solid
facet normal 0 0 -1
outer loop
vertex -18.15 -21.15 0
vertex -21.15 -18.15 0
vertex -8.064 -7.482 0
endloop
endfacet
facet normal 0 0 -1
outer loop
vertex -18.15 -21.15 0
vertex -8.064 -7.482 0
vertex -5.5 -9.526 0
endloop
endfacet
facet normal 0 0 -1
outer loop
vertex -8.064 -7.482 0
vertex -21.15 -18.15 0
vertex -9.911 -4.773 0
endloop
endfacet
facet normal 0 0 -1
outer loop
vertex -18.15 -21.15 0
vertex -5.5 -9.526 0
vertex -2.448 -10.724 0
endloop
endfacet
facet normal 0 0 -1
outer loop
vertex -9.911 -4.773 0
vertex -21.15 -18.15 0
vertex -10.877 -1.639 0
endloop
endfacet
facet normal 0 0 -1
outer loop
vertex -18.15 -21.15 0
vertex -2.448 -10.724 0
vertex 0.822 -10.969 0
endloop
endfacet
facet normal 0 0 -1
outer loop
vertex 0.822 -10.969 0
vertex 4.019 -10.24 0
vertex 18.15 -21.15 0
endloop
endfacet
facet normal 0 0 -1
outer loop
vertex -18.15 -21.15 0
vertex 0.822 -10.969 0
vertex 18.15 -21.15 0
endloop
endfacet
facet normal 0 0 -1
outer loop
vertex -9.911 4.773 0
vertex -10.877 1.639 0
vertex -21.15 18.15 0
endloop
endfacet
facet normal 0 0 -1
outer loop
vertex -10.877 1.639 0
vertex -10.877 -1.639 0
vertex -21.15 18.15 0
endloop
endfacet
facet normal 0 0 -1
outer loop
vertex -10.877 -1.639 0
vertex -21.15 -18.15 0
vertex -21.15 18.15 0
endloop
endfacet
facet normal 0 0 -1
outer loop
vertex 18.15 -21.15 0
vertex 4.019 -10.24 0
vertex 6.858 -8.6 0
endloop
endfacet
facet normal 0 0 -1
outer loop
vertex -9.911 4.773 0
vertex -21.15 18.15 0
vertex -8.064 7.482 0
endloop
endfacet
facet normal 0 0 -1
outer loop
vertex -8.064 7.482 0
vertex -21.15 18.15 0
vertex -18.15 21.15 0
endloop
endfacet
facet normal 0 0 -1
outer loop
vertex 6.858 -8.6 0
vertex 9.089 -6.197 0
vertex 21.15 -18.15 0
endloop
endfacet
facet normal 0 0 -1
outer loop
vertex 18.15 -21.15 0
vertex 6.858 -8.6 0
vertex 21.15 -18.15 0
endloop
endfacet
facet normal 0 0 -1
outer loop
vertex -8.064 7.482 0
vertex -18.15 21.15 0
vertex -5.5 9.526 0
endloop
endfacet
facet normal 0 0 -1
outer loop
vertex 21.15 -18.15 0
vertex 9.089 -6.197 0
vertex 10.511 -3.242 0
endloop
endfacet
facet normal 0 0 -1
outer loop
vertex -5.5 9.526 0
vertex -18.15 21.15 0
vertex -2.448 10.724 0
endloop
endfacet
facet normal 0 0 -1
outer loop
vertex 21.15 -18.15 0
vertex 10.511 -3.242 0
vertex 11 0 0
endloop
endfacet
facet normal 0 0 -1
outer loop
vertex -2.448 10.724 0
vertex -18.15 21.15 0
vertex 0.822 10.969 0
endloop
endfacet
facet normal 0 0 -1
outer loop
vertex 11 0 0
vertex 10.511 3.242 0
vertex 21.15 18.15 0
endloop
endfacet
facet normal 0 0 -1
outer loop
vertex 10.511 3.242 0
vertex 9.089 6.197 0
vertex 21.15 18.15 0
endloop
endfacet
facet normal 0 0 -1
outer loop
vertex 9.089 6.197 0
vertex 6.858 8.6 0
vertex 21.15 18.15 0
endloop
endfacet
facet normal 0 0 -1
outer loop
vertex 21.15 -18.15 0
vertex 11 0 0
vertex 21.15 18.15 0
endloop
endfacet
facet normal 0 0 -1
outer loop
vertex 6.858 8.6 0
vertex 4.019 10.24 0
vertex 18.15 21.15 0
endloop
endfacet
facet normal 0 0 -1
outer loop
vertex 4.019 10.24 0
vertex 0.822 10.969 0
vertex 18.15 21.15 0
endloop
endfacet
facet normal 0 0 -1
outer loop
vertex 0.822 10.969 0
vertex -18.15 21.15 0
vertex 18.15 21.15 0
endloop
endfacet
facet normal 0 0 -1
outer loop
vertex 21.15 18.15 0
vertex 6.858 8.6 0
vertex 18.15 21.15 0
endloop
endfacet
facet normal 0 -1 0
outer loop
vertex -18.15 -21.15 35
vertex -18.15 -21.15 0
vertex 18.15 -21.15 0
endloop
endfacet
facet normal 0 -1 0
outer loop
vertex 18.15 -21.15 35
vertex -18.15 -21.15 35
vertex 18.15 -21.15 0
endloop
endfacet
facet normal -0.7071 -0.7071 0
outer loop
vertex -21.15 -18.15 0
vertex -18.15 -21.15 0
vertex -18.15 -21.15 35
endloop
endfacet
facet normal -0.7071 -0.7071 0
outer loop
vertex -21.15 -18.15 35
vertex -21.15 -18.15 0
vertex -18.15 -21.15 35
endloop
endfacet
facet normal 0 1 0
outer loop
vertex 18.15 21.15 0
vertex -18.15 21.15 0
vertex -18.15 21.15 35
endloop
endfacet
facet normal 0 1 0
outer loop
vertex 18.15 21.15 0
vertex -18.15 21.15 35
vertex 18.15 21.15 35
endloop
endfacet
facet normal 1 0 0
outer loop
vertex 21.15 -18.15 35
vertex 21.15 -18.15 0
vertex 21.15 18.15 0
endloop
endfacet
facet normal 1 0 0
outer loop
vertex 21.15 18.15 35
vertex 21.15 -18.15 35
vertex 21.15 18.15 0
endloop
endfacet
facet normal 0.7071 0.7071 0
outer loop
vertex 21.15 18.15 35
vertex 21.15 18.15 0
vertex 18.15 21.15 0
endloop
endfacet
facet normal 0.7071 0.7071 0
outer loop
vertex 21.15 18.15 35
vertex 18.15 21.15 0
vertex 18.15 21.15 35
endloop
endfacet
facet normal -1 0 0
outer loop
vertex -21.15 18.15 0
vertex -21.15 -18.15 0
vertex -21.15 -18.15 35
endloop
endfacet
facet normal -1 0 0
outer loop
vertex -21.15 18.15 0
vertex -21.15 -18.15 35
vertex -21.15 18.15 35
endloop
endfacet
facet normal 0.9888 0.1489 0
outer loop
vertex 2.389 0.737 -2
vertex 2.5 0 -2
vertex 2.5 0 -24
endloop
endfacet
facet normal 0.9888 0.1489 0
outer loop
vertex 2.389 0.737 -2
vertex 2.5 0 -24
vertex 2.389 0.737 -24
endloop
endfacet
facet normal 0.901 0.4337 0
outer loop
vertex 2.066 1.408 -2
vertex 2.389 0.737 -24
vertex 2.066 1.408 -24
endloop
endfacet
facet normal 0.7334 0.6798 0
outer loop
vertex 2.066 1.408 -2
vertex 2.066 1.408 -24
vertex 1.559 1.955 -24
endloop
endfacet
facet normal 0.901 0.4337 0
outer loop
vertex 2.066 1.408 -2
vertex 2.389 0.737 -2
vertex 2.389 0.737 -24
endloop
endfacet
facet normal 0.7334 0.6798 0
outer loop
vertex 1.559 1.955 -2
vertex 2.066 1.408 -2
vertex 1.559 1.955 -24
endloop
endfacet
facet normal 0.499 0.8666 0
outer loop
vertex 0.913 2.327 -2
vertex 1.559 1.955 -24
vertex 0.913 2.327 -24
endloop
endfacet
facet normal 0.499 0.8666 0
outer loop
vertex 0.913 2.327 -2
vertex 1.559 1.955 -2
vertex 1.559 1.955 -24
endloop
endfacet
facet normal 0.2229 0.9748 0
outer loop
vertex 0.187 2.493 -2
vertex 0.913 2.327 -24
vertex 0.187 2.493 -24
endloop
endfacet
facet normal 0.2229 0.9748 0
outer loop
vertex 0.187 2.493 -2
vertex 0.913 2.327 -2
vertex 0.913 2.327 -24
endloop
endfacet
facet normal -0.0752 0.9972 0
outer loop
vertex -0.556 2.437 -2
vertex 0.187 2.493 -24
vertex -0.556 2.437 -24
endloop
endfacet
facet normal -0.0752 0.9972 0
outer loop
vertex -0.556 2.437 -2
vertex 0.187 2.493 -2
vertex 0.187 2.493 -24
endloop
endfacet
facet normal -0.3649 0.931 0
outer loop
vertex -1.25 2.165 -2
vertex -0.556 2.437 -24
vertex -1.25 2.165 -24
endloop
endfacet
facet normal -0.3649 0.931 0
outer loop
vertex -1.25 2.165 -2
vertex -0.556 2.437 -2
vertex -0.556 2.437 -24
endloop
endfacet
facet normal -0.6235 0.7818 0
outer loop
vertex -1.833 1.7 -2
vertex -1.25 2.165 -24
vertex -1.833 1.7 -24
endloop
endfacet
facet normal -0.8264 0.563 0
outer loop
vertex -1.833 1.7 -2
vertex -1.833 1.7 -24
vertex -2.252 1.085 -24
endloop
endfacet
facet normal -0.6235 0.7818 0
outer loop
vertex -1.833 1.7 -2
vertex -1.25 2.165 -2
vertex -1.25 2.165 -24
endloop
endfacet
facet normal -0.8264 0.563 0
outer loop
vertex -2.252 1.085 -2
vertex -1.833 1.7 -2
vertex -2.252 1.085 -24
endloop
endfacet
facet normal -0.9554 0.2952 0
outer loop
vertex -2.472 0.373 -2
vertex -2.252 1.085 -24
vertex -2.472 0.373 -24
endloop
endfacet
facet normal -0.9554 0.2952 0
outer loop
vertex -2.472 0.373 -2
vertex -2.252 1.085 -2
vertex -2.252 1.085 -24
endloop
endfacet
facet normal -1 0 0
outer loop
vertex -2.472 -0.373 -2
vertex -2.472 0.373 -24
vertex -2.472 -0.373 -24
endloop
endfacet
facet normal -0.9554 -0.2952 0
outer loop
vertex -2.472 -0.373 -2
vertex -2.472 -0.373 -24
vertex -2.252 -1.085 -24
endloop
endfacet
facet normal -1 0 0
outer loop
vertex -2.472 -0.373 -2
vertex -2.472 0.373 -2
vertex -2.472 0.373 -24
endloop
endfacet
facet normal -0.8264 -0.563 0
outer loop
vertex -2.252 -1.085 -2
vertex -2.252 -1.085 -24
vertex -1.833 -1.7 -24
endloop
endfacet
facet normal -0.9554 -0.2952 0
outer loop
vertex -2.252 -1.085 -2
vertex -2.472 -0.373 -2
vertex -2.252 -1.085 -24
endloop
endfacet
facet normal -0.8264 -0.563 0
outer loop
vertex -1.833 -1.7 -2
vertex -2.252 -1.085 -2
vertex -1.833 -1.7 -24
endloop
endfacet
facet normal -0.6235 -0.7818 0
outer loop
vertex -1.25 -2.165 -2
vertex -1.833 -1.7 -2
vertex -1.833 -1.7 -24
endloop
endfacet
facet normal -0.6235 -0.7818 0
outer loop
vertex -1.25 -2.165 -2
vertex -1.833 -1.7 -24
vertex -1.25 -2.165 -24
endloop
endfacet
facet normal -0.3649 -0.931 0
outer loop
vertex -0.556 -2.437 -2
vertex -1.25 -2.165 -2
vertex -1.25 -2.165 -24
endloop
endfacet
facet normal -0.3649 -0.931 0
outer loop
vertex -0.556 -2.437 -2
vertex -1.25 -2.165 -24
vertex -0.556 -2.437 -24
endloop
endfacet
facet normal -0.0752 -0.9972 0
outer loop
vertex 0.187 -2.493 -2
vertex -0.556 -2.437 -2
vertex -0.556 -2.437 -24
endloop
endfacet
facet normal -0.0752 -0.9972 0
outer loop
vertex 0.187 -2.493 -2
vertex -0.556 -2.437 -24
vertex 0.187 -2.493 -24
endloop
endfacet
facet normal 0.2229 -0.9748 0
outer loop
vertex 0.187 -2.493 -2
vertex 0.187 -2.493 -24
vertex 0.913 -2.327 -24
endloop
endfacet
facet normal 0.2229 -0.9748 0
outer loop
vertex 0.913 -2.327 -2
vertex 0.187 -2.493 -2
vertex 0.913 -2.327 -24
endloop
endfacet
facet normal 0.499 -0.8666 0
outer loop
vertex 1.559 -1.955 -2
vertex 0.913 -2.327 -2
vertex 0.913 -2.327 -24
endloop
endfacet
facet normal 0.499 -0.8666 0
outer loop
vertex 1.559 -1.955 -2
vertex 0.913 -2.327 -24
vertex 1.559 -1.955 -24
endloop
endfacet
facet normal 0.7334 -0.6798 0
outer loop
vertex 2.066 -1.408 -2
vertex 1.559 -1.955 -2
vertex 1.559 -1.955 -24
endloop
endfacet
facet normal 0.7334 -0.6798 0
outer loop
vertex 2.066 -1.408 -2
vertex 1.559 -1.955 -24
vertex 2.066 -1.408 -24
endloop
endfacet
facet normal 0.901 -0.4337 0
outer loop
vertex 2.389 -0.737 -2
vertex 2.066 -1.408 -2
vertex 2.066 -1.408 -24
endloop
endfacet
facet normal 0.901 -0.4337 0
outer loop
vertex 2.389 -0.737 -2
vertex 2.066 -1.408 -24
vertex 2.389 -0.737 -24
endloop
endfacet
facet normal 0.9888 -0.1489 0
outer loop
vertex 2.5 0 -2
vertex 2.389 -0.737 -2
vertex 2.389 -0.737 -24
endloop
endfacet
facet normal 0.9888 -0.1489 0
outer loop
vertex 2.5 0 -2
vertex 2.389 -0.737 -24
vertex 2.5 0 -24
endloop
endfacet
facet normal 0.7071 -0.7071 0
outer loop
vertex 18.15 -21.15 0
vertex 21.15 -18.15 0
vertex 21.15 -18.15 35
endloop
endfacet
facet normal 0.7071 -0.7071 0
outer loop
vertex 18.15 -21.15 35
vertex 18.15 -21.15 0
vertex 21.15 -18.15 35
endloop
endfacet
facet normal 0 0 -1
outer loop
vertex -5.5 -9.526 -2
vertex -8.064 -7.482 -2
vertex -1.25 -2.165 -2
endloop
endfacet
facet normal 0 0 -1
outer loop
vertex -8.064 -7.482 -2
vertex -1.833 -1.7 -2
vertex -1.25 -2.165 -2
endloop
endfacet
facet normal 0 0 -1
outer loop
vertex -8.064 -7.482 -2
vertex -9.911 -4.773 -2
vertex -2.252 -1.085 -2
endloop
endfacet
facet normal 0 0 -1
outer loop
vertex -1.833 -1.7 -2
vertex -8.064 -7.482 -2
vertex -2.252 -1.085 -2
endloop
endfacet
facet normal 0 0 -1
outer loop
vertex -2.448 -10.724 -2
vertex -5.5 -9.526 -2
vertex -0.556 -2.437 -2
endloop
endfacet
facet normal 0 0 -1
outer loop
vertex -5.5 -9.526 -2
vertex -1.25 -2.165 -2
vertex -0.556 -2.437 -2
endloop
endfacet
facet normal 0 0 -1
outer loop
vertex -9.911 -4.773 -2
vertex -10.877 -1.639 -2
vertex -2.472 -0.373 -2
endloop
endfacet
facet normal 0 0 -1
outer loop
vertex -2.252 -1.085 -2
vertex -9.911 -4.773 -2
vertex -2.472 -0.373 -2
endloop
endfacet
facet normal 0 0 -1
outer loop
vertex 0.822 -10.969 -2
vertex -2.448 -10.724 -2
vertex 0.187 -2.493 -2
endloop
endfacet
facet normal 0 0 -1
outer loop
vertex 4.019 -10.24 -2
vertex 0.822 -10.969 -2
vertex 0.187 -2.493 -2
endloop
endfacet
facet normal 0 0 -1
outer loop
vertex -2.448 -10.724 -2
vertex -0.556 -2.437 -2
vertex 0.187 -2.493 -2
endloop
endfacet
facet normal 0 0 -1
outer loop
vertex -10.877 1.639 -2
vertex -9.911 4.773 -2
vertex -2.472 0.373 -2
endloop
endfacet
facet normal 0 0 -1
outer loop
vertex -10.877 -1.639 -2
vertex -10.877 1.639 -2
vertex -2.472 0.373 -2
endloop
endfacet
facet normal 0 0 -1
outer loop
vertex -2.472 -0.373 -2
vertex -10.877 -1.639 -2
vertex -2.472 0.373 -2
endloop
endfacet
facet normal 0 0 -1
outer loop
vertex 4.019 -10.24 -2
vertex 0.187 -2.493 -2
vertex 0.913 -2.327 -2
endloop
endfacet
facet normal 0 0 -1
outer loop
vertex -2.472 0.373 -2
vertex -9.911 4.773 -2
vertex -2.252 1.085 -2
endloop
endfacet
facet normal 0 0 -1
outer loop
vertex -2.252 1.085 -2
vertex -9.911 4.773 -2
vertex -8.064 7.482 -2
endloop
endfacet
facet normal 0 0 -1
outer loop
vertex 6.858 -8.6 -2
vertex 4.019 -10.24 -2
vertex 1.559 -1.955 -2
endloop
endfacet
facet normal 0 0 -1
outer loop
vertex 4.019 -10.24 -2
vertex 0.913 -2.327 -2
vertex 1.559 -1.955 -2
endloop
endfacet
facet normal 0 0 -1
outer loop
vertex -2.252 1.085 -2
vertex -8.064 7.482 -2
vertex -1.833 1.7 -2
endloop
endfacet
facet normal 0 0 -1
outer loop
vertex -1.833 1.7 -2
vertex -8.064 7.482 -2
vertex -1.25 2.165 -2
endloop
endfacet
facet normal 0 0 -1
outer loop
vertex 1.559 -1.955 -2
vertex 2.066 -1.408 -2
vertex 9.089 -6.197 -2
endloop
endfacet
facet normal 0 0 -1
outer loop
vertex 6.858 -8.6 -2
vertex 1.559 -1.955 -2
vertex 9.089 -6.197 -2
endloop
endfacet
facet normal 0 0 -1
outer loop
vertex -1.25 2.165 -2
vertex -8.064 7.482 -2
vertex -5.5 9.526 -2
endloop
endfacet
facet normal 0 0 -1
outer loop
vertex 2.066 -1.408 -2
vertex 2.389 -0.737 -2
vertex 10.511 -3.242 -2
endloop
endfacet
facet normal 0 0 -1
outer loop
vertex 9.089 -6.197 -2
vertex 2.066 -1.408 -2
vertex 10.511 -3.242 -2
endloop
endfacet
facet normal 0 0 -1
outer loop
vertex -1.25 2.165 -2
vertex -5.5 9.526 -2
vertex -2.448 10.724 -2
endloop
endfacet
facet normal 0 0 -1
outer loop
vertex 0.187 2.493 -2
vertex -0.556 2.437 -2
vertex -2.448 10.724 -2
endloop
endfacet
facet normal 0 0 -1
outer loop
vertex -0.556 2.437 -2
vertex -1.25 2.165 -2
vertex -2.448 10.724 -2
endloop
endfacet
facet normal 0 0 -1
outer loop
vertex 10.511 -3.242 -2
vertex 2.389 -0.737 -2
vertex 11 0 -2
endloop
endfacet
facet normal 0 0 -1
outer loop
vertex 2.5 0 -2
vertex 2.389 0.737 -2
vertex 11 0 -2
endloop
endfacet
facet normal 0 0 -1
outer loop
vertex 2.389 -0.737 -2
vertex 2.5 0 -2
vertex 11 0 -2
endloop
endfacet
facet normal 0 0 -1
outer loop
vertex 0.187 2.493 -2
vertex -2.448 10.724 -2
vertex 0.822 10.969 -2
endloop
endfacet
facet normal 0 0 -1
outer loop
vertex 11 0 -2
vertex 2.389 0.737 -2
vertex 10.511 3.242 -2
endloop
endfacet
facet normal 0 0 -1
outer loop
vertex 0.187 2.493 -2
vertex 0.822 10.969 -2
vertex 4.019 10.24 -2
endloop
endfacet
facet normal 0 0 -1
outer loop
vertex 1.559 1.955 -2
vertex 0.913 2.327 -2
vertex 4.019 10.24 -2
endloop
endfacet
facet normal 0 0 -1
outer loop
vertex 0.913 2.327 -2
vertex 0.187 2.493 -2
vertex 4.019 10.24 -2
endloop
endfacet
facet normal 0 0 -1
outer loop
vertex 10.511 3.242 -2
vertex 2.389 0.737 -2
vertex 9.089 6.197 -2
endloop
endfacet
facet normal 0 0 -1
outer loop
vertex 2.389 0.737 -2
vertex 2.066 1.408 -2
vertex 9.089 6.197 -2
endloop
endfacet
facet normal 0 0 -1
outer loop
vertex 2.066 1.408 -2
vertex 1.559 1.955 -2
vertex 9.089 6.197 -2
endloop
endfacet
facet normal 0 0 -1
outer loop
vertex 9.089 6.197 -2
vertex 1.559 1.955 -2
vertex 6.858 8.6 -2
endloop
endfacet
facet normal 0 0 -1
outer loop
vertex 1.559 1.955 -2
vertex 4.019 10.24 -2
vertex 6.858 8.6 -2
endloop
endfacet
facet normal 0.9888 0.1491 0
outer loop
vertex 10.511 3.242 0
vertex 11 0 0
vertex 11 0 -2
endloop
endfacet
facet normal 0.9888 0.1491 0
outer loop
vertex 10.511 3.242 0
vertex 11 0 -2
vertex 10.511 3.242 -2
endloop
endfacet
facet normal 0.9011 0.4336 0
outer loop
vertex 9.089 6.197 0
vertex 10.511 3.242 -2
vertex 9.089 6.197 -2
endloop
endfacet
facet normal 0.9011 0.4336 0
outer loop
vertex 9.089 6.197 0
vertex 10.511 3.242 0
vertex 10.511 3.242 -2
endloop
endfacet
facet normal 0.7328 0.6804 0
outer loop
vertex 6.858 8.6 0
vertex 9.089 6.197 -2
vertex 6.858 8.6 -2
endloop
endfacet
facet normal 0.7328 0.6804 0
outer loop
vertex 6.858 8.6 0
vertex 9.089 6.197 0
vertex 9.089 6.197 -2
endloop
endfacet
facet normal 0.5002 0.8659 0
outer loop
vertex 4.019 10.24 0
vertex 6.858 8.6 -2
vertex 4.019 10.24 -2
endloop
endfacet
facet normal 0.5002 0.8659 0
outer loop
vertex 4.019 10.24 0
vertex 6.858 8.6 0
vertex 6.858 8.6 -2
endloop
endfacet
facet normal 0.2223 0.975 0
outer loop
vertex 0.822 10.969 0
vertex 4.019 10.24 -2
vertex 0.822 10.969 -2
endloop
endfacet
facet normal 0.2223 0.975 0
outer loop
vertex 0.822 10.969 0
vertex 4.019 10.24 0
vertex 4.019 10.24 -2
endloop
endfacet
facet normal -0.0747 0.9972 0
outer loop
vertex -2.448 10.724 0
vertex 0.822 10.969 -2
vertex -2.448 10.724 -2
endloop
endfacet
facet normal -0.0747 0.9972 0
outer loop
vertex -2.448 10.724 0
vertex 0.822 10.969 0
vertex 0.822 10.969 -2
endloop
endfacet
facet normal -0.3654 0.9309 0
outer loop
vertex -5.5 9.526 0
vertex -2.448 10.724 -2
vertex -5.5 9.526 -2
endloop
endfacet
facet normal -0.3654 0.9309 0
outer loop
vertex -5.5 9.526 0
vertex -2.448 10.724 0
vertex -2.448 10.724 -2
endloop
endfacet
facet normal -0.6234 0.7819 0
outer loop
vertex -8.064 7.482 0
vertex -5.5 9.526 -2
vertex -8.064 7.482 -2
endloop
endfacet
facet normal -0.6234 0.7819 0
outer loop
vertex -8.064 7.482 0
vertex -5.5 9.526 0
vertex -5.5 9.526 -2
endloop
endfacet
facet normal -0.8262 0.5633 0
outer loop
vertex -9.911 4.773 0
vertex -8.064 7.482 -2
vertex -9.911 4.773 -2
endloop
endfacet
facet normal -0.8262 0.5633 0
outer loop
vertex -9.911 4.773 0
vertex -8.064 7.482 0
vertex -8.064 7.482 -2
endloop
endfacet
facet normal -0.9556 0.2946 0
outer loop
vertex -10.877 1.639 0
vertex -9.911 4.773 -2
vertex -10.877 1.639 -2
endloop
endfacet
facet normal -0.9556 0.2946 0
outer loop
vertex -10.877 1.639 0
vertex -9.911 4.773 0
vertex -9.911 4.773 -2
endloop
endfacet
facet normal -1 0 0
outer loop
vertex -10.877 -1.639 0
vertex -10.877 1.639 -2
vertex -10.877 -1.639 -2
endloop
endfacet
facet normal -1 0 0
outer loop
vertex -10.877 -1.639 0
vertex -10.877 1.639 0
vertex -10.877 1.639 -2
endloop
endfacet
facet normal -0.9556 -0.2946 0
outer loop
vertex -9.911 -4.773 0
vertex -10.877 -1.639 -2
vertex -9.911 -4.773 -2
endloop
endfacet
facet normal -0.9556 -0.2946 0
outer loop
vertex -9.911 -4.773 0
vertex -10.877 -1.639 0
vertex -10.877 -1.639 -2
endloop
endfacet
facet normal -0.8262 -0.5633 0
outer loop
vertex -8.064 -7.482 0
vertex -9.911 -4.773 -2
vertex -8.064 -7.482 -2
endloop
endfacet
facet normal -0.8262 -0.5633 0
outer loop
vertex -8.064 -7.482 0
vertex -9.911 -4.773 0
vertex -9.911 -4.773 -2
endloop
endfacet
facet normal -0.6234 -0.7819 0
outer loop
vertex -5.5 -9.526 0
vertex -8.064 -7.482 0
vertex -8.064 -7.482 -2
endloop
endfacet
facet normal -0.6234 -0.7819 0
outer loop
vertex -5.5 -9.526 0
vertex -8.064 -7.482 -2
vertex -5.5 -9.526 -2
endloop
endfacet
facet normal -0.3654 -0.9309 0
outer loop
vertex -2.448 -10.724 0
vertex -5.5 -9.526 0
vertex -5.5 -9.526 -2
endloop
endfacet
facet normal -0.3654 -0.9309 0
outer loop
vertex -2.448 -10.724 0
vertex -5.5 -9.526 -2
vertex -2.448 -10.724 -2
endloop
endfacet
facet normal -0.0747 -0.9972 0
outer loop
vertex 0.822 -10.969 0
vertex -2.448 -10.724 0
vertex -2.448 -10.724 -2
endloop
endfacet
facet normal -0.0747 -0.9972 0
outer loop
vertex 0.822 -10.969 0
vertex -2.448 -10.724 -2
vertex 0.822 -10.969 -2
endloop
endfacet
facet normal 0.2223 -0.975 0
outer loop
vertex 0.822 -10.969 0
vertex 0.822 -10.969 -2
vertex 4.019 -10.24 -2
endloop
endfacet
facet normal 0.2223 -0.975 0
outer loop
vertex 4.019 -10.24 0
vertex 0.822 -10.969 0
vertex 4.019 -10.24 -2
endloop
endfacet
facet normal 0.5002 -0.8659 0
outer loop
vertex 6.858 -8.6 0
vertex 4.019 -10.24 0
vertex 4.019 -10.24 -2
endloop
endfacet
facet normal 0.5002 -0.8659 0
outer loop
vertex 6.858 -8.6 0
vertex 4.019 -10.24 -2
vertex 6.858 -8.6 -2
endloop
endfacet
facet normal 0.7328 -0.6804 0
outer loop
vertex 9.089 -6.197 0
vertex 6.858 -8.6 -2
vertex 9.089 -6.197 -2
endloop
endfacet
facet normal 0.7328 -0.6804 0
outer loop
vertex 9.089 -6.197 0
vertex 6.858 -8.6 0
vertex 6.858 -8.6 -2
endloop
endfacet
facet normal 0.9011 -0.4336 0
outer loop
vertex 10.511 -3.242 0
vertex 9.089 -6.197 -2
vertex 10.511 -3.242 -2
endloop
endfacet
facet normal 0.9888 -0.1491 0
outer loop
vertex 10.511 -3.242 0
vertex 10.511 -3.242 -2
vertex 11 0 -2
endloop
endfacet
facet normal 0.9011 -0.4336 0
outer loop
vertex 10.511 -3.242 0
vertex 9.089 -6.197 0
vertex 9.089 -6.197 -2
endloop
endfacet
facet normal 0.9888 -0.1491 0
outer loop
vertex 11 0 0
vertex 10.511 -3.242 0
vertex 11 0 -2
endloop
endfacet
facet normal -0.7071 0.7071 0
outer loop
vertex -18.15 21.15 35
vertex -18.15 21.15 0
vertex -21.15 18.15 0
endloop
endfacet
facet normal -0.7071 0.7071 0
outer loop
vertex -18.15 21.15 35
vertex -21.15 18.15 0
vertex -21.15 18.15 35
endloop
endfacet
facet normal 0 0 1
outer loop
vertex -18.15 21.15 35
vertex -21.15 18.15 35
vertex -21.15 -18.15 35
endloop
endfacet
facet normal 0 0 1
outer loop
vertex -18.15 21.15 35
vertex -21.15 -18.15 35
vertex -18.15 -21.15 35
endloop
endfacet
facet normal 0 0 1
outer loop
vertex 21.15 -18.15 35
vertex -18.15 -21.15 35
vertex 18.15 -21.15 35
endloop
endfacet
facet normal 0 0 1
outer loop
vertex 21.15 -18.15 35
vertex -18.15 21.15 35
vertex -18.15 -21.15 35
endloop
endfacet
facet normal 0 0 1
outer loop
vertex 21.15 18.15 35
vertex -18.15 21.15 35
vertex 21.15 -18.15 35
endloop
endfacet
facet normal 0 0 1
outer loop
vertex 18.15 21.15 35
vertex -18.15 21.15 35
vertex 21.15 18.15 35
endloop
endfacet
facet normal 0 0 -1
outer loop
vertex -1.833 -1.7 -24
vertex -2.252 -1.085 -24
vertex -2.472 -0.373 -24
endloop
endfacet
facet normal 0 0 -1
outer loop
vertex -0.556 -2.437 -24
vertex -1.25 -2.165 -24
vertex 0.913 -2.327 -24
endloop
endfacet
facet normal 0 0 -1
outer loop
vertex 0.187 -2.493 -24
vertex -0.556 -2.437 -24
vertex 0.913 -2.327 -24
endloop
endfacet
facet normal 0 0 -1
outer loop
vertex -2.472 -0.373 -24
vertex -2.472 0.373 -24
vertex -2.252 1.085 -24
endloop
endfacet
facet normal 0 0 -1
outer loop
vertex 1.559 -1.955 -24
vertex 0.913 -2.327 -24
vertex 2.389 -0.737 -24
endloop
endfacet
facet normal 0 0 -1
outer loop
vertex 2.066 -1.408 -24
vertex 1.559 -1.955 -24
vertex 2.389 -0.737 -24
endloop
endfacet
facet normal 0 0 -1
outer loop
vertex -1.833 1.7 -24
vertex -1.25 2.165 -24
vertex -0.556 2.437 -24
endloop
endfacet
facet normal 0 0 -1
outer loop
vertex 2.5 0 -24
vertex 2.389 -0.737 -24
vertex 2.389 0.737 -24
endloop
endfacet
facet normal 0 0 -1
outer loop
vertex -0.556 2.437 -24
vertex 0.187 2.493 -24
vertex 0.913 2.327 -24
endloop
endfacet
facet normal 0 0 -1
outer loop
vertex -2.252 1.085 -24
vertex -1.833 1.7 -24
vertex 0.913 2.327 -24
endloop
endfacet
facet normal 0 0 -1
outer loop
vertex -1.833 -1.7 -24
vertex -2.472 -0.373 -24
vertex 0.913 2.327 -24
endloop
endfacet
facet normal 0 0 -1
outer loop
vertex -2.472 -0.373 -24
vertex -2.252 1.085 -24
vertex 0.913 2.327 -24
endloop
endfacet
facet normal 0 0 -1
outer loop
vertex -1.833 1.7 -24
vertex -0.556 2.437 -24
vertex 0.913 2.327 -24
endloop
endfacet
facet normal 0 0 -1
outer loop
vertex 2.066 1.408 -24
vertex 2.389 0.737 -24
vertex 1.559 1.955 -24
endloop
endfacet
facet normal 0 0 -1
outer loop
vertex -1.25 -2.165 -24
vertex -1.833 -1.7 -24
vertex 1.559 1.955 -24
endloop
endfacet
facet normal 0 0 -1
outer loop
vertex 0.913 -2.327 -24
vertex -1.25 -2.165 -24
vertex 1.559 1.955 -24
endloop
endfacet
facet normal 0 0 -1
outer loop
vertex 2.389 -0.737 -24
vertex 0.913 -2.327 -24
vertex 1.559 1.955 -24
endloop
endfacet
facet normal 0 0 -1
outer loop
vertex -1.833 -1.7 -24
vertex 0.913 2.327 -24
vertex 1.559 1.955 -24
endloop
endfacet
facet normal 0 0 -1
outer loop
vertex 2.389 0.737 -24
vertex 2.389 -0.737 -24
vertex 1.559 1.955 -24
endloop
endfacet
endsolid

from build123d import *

# Parameters (mm, degrees)
F0_W     = 42.3
F0_H     = 42.3
F0_R     = 11
F0_R_2   = 2.5
F1_DEPTH = 35
F2_DEPTH = 24
F3_DEPTH = 2
F4_SIZE  = 3


with BuildPart() as f1:
    # F0 (on Top) → F1 (new body)
    with BuildSketch(Plane.XY):
        Rectangle(F0_W, F0_H)
        Circle(F0_R, mode=Mode.SUBTRACT)
        Circle(F0_R)
        Circle(F0_R_2, mode=Mode.SUBTRACT)
        Circle(F0_R_2)
    extrude(amount=F1_DEPTH)

    # F0 (on Top) → F2 (join)
    with BuildSketch(Plane.XY):
        Circle(F0_R_2)
    extrude(amount=-F2_DEPTH)

    # F0 (on Top) → F3 (join)
    with BuildSketch(Plane.XY):
        Circle(F0_R)
        Circle(F0_R_2, mode=Mode.SUBTRACT)
    extrude(amount=-F3_DEPTH)

    # F4
    f4_edges = [f1.edges().sort_by_distance(p)[0] for p in [
        (-21.15, -21.15, 17.5),
        (21.15, -21.15, 17.5),
        (21.15, 21.15, 17.5),
        (-21.15, 21.15, 17.5),
    ]]
    chamfer(f4_edges, length=F4_SIZE)


solid = f1.part
